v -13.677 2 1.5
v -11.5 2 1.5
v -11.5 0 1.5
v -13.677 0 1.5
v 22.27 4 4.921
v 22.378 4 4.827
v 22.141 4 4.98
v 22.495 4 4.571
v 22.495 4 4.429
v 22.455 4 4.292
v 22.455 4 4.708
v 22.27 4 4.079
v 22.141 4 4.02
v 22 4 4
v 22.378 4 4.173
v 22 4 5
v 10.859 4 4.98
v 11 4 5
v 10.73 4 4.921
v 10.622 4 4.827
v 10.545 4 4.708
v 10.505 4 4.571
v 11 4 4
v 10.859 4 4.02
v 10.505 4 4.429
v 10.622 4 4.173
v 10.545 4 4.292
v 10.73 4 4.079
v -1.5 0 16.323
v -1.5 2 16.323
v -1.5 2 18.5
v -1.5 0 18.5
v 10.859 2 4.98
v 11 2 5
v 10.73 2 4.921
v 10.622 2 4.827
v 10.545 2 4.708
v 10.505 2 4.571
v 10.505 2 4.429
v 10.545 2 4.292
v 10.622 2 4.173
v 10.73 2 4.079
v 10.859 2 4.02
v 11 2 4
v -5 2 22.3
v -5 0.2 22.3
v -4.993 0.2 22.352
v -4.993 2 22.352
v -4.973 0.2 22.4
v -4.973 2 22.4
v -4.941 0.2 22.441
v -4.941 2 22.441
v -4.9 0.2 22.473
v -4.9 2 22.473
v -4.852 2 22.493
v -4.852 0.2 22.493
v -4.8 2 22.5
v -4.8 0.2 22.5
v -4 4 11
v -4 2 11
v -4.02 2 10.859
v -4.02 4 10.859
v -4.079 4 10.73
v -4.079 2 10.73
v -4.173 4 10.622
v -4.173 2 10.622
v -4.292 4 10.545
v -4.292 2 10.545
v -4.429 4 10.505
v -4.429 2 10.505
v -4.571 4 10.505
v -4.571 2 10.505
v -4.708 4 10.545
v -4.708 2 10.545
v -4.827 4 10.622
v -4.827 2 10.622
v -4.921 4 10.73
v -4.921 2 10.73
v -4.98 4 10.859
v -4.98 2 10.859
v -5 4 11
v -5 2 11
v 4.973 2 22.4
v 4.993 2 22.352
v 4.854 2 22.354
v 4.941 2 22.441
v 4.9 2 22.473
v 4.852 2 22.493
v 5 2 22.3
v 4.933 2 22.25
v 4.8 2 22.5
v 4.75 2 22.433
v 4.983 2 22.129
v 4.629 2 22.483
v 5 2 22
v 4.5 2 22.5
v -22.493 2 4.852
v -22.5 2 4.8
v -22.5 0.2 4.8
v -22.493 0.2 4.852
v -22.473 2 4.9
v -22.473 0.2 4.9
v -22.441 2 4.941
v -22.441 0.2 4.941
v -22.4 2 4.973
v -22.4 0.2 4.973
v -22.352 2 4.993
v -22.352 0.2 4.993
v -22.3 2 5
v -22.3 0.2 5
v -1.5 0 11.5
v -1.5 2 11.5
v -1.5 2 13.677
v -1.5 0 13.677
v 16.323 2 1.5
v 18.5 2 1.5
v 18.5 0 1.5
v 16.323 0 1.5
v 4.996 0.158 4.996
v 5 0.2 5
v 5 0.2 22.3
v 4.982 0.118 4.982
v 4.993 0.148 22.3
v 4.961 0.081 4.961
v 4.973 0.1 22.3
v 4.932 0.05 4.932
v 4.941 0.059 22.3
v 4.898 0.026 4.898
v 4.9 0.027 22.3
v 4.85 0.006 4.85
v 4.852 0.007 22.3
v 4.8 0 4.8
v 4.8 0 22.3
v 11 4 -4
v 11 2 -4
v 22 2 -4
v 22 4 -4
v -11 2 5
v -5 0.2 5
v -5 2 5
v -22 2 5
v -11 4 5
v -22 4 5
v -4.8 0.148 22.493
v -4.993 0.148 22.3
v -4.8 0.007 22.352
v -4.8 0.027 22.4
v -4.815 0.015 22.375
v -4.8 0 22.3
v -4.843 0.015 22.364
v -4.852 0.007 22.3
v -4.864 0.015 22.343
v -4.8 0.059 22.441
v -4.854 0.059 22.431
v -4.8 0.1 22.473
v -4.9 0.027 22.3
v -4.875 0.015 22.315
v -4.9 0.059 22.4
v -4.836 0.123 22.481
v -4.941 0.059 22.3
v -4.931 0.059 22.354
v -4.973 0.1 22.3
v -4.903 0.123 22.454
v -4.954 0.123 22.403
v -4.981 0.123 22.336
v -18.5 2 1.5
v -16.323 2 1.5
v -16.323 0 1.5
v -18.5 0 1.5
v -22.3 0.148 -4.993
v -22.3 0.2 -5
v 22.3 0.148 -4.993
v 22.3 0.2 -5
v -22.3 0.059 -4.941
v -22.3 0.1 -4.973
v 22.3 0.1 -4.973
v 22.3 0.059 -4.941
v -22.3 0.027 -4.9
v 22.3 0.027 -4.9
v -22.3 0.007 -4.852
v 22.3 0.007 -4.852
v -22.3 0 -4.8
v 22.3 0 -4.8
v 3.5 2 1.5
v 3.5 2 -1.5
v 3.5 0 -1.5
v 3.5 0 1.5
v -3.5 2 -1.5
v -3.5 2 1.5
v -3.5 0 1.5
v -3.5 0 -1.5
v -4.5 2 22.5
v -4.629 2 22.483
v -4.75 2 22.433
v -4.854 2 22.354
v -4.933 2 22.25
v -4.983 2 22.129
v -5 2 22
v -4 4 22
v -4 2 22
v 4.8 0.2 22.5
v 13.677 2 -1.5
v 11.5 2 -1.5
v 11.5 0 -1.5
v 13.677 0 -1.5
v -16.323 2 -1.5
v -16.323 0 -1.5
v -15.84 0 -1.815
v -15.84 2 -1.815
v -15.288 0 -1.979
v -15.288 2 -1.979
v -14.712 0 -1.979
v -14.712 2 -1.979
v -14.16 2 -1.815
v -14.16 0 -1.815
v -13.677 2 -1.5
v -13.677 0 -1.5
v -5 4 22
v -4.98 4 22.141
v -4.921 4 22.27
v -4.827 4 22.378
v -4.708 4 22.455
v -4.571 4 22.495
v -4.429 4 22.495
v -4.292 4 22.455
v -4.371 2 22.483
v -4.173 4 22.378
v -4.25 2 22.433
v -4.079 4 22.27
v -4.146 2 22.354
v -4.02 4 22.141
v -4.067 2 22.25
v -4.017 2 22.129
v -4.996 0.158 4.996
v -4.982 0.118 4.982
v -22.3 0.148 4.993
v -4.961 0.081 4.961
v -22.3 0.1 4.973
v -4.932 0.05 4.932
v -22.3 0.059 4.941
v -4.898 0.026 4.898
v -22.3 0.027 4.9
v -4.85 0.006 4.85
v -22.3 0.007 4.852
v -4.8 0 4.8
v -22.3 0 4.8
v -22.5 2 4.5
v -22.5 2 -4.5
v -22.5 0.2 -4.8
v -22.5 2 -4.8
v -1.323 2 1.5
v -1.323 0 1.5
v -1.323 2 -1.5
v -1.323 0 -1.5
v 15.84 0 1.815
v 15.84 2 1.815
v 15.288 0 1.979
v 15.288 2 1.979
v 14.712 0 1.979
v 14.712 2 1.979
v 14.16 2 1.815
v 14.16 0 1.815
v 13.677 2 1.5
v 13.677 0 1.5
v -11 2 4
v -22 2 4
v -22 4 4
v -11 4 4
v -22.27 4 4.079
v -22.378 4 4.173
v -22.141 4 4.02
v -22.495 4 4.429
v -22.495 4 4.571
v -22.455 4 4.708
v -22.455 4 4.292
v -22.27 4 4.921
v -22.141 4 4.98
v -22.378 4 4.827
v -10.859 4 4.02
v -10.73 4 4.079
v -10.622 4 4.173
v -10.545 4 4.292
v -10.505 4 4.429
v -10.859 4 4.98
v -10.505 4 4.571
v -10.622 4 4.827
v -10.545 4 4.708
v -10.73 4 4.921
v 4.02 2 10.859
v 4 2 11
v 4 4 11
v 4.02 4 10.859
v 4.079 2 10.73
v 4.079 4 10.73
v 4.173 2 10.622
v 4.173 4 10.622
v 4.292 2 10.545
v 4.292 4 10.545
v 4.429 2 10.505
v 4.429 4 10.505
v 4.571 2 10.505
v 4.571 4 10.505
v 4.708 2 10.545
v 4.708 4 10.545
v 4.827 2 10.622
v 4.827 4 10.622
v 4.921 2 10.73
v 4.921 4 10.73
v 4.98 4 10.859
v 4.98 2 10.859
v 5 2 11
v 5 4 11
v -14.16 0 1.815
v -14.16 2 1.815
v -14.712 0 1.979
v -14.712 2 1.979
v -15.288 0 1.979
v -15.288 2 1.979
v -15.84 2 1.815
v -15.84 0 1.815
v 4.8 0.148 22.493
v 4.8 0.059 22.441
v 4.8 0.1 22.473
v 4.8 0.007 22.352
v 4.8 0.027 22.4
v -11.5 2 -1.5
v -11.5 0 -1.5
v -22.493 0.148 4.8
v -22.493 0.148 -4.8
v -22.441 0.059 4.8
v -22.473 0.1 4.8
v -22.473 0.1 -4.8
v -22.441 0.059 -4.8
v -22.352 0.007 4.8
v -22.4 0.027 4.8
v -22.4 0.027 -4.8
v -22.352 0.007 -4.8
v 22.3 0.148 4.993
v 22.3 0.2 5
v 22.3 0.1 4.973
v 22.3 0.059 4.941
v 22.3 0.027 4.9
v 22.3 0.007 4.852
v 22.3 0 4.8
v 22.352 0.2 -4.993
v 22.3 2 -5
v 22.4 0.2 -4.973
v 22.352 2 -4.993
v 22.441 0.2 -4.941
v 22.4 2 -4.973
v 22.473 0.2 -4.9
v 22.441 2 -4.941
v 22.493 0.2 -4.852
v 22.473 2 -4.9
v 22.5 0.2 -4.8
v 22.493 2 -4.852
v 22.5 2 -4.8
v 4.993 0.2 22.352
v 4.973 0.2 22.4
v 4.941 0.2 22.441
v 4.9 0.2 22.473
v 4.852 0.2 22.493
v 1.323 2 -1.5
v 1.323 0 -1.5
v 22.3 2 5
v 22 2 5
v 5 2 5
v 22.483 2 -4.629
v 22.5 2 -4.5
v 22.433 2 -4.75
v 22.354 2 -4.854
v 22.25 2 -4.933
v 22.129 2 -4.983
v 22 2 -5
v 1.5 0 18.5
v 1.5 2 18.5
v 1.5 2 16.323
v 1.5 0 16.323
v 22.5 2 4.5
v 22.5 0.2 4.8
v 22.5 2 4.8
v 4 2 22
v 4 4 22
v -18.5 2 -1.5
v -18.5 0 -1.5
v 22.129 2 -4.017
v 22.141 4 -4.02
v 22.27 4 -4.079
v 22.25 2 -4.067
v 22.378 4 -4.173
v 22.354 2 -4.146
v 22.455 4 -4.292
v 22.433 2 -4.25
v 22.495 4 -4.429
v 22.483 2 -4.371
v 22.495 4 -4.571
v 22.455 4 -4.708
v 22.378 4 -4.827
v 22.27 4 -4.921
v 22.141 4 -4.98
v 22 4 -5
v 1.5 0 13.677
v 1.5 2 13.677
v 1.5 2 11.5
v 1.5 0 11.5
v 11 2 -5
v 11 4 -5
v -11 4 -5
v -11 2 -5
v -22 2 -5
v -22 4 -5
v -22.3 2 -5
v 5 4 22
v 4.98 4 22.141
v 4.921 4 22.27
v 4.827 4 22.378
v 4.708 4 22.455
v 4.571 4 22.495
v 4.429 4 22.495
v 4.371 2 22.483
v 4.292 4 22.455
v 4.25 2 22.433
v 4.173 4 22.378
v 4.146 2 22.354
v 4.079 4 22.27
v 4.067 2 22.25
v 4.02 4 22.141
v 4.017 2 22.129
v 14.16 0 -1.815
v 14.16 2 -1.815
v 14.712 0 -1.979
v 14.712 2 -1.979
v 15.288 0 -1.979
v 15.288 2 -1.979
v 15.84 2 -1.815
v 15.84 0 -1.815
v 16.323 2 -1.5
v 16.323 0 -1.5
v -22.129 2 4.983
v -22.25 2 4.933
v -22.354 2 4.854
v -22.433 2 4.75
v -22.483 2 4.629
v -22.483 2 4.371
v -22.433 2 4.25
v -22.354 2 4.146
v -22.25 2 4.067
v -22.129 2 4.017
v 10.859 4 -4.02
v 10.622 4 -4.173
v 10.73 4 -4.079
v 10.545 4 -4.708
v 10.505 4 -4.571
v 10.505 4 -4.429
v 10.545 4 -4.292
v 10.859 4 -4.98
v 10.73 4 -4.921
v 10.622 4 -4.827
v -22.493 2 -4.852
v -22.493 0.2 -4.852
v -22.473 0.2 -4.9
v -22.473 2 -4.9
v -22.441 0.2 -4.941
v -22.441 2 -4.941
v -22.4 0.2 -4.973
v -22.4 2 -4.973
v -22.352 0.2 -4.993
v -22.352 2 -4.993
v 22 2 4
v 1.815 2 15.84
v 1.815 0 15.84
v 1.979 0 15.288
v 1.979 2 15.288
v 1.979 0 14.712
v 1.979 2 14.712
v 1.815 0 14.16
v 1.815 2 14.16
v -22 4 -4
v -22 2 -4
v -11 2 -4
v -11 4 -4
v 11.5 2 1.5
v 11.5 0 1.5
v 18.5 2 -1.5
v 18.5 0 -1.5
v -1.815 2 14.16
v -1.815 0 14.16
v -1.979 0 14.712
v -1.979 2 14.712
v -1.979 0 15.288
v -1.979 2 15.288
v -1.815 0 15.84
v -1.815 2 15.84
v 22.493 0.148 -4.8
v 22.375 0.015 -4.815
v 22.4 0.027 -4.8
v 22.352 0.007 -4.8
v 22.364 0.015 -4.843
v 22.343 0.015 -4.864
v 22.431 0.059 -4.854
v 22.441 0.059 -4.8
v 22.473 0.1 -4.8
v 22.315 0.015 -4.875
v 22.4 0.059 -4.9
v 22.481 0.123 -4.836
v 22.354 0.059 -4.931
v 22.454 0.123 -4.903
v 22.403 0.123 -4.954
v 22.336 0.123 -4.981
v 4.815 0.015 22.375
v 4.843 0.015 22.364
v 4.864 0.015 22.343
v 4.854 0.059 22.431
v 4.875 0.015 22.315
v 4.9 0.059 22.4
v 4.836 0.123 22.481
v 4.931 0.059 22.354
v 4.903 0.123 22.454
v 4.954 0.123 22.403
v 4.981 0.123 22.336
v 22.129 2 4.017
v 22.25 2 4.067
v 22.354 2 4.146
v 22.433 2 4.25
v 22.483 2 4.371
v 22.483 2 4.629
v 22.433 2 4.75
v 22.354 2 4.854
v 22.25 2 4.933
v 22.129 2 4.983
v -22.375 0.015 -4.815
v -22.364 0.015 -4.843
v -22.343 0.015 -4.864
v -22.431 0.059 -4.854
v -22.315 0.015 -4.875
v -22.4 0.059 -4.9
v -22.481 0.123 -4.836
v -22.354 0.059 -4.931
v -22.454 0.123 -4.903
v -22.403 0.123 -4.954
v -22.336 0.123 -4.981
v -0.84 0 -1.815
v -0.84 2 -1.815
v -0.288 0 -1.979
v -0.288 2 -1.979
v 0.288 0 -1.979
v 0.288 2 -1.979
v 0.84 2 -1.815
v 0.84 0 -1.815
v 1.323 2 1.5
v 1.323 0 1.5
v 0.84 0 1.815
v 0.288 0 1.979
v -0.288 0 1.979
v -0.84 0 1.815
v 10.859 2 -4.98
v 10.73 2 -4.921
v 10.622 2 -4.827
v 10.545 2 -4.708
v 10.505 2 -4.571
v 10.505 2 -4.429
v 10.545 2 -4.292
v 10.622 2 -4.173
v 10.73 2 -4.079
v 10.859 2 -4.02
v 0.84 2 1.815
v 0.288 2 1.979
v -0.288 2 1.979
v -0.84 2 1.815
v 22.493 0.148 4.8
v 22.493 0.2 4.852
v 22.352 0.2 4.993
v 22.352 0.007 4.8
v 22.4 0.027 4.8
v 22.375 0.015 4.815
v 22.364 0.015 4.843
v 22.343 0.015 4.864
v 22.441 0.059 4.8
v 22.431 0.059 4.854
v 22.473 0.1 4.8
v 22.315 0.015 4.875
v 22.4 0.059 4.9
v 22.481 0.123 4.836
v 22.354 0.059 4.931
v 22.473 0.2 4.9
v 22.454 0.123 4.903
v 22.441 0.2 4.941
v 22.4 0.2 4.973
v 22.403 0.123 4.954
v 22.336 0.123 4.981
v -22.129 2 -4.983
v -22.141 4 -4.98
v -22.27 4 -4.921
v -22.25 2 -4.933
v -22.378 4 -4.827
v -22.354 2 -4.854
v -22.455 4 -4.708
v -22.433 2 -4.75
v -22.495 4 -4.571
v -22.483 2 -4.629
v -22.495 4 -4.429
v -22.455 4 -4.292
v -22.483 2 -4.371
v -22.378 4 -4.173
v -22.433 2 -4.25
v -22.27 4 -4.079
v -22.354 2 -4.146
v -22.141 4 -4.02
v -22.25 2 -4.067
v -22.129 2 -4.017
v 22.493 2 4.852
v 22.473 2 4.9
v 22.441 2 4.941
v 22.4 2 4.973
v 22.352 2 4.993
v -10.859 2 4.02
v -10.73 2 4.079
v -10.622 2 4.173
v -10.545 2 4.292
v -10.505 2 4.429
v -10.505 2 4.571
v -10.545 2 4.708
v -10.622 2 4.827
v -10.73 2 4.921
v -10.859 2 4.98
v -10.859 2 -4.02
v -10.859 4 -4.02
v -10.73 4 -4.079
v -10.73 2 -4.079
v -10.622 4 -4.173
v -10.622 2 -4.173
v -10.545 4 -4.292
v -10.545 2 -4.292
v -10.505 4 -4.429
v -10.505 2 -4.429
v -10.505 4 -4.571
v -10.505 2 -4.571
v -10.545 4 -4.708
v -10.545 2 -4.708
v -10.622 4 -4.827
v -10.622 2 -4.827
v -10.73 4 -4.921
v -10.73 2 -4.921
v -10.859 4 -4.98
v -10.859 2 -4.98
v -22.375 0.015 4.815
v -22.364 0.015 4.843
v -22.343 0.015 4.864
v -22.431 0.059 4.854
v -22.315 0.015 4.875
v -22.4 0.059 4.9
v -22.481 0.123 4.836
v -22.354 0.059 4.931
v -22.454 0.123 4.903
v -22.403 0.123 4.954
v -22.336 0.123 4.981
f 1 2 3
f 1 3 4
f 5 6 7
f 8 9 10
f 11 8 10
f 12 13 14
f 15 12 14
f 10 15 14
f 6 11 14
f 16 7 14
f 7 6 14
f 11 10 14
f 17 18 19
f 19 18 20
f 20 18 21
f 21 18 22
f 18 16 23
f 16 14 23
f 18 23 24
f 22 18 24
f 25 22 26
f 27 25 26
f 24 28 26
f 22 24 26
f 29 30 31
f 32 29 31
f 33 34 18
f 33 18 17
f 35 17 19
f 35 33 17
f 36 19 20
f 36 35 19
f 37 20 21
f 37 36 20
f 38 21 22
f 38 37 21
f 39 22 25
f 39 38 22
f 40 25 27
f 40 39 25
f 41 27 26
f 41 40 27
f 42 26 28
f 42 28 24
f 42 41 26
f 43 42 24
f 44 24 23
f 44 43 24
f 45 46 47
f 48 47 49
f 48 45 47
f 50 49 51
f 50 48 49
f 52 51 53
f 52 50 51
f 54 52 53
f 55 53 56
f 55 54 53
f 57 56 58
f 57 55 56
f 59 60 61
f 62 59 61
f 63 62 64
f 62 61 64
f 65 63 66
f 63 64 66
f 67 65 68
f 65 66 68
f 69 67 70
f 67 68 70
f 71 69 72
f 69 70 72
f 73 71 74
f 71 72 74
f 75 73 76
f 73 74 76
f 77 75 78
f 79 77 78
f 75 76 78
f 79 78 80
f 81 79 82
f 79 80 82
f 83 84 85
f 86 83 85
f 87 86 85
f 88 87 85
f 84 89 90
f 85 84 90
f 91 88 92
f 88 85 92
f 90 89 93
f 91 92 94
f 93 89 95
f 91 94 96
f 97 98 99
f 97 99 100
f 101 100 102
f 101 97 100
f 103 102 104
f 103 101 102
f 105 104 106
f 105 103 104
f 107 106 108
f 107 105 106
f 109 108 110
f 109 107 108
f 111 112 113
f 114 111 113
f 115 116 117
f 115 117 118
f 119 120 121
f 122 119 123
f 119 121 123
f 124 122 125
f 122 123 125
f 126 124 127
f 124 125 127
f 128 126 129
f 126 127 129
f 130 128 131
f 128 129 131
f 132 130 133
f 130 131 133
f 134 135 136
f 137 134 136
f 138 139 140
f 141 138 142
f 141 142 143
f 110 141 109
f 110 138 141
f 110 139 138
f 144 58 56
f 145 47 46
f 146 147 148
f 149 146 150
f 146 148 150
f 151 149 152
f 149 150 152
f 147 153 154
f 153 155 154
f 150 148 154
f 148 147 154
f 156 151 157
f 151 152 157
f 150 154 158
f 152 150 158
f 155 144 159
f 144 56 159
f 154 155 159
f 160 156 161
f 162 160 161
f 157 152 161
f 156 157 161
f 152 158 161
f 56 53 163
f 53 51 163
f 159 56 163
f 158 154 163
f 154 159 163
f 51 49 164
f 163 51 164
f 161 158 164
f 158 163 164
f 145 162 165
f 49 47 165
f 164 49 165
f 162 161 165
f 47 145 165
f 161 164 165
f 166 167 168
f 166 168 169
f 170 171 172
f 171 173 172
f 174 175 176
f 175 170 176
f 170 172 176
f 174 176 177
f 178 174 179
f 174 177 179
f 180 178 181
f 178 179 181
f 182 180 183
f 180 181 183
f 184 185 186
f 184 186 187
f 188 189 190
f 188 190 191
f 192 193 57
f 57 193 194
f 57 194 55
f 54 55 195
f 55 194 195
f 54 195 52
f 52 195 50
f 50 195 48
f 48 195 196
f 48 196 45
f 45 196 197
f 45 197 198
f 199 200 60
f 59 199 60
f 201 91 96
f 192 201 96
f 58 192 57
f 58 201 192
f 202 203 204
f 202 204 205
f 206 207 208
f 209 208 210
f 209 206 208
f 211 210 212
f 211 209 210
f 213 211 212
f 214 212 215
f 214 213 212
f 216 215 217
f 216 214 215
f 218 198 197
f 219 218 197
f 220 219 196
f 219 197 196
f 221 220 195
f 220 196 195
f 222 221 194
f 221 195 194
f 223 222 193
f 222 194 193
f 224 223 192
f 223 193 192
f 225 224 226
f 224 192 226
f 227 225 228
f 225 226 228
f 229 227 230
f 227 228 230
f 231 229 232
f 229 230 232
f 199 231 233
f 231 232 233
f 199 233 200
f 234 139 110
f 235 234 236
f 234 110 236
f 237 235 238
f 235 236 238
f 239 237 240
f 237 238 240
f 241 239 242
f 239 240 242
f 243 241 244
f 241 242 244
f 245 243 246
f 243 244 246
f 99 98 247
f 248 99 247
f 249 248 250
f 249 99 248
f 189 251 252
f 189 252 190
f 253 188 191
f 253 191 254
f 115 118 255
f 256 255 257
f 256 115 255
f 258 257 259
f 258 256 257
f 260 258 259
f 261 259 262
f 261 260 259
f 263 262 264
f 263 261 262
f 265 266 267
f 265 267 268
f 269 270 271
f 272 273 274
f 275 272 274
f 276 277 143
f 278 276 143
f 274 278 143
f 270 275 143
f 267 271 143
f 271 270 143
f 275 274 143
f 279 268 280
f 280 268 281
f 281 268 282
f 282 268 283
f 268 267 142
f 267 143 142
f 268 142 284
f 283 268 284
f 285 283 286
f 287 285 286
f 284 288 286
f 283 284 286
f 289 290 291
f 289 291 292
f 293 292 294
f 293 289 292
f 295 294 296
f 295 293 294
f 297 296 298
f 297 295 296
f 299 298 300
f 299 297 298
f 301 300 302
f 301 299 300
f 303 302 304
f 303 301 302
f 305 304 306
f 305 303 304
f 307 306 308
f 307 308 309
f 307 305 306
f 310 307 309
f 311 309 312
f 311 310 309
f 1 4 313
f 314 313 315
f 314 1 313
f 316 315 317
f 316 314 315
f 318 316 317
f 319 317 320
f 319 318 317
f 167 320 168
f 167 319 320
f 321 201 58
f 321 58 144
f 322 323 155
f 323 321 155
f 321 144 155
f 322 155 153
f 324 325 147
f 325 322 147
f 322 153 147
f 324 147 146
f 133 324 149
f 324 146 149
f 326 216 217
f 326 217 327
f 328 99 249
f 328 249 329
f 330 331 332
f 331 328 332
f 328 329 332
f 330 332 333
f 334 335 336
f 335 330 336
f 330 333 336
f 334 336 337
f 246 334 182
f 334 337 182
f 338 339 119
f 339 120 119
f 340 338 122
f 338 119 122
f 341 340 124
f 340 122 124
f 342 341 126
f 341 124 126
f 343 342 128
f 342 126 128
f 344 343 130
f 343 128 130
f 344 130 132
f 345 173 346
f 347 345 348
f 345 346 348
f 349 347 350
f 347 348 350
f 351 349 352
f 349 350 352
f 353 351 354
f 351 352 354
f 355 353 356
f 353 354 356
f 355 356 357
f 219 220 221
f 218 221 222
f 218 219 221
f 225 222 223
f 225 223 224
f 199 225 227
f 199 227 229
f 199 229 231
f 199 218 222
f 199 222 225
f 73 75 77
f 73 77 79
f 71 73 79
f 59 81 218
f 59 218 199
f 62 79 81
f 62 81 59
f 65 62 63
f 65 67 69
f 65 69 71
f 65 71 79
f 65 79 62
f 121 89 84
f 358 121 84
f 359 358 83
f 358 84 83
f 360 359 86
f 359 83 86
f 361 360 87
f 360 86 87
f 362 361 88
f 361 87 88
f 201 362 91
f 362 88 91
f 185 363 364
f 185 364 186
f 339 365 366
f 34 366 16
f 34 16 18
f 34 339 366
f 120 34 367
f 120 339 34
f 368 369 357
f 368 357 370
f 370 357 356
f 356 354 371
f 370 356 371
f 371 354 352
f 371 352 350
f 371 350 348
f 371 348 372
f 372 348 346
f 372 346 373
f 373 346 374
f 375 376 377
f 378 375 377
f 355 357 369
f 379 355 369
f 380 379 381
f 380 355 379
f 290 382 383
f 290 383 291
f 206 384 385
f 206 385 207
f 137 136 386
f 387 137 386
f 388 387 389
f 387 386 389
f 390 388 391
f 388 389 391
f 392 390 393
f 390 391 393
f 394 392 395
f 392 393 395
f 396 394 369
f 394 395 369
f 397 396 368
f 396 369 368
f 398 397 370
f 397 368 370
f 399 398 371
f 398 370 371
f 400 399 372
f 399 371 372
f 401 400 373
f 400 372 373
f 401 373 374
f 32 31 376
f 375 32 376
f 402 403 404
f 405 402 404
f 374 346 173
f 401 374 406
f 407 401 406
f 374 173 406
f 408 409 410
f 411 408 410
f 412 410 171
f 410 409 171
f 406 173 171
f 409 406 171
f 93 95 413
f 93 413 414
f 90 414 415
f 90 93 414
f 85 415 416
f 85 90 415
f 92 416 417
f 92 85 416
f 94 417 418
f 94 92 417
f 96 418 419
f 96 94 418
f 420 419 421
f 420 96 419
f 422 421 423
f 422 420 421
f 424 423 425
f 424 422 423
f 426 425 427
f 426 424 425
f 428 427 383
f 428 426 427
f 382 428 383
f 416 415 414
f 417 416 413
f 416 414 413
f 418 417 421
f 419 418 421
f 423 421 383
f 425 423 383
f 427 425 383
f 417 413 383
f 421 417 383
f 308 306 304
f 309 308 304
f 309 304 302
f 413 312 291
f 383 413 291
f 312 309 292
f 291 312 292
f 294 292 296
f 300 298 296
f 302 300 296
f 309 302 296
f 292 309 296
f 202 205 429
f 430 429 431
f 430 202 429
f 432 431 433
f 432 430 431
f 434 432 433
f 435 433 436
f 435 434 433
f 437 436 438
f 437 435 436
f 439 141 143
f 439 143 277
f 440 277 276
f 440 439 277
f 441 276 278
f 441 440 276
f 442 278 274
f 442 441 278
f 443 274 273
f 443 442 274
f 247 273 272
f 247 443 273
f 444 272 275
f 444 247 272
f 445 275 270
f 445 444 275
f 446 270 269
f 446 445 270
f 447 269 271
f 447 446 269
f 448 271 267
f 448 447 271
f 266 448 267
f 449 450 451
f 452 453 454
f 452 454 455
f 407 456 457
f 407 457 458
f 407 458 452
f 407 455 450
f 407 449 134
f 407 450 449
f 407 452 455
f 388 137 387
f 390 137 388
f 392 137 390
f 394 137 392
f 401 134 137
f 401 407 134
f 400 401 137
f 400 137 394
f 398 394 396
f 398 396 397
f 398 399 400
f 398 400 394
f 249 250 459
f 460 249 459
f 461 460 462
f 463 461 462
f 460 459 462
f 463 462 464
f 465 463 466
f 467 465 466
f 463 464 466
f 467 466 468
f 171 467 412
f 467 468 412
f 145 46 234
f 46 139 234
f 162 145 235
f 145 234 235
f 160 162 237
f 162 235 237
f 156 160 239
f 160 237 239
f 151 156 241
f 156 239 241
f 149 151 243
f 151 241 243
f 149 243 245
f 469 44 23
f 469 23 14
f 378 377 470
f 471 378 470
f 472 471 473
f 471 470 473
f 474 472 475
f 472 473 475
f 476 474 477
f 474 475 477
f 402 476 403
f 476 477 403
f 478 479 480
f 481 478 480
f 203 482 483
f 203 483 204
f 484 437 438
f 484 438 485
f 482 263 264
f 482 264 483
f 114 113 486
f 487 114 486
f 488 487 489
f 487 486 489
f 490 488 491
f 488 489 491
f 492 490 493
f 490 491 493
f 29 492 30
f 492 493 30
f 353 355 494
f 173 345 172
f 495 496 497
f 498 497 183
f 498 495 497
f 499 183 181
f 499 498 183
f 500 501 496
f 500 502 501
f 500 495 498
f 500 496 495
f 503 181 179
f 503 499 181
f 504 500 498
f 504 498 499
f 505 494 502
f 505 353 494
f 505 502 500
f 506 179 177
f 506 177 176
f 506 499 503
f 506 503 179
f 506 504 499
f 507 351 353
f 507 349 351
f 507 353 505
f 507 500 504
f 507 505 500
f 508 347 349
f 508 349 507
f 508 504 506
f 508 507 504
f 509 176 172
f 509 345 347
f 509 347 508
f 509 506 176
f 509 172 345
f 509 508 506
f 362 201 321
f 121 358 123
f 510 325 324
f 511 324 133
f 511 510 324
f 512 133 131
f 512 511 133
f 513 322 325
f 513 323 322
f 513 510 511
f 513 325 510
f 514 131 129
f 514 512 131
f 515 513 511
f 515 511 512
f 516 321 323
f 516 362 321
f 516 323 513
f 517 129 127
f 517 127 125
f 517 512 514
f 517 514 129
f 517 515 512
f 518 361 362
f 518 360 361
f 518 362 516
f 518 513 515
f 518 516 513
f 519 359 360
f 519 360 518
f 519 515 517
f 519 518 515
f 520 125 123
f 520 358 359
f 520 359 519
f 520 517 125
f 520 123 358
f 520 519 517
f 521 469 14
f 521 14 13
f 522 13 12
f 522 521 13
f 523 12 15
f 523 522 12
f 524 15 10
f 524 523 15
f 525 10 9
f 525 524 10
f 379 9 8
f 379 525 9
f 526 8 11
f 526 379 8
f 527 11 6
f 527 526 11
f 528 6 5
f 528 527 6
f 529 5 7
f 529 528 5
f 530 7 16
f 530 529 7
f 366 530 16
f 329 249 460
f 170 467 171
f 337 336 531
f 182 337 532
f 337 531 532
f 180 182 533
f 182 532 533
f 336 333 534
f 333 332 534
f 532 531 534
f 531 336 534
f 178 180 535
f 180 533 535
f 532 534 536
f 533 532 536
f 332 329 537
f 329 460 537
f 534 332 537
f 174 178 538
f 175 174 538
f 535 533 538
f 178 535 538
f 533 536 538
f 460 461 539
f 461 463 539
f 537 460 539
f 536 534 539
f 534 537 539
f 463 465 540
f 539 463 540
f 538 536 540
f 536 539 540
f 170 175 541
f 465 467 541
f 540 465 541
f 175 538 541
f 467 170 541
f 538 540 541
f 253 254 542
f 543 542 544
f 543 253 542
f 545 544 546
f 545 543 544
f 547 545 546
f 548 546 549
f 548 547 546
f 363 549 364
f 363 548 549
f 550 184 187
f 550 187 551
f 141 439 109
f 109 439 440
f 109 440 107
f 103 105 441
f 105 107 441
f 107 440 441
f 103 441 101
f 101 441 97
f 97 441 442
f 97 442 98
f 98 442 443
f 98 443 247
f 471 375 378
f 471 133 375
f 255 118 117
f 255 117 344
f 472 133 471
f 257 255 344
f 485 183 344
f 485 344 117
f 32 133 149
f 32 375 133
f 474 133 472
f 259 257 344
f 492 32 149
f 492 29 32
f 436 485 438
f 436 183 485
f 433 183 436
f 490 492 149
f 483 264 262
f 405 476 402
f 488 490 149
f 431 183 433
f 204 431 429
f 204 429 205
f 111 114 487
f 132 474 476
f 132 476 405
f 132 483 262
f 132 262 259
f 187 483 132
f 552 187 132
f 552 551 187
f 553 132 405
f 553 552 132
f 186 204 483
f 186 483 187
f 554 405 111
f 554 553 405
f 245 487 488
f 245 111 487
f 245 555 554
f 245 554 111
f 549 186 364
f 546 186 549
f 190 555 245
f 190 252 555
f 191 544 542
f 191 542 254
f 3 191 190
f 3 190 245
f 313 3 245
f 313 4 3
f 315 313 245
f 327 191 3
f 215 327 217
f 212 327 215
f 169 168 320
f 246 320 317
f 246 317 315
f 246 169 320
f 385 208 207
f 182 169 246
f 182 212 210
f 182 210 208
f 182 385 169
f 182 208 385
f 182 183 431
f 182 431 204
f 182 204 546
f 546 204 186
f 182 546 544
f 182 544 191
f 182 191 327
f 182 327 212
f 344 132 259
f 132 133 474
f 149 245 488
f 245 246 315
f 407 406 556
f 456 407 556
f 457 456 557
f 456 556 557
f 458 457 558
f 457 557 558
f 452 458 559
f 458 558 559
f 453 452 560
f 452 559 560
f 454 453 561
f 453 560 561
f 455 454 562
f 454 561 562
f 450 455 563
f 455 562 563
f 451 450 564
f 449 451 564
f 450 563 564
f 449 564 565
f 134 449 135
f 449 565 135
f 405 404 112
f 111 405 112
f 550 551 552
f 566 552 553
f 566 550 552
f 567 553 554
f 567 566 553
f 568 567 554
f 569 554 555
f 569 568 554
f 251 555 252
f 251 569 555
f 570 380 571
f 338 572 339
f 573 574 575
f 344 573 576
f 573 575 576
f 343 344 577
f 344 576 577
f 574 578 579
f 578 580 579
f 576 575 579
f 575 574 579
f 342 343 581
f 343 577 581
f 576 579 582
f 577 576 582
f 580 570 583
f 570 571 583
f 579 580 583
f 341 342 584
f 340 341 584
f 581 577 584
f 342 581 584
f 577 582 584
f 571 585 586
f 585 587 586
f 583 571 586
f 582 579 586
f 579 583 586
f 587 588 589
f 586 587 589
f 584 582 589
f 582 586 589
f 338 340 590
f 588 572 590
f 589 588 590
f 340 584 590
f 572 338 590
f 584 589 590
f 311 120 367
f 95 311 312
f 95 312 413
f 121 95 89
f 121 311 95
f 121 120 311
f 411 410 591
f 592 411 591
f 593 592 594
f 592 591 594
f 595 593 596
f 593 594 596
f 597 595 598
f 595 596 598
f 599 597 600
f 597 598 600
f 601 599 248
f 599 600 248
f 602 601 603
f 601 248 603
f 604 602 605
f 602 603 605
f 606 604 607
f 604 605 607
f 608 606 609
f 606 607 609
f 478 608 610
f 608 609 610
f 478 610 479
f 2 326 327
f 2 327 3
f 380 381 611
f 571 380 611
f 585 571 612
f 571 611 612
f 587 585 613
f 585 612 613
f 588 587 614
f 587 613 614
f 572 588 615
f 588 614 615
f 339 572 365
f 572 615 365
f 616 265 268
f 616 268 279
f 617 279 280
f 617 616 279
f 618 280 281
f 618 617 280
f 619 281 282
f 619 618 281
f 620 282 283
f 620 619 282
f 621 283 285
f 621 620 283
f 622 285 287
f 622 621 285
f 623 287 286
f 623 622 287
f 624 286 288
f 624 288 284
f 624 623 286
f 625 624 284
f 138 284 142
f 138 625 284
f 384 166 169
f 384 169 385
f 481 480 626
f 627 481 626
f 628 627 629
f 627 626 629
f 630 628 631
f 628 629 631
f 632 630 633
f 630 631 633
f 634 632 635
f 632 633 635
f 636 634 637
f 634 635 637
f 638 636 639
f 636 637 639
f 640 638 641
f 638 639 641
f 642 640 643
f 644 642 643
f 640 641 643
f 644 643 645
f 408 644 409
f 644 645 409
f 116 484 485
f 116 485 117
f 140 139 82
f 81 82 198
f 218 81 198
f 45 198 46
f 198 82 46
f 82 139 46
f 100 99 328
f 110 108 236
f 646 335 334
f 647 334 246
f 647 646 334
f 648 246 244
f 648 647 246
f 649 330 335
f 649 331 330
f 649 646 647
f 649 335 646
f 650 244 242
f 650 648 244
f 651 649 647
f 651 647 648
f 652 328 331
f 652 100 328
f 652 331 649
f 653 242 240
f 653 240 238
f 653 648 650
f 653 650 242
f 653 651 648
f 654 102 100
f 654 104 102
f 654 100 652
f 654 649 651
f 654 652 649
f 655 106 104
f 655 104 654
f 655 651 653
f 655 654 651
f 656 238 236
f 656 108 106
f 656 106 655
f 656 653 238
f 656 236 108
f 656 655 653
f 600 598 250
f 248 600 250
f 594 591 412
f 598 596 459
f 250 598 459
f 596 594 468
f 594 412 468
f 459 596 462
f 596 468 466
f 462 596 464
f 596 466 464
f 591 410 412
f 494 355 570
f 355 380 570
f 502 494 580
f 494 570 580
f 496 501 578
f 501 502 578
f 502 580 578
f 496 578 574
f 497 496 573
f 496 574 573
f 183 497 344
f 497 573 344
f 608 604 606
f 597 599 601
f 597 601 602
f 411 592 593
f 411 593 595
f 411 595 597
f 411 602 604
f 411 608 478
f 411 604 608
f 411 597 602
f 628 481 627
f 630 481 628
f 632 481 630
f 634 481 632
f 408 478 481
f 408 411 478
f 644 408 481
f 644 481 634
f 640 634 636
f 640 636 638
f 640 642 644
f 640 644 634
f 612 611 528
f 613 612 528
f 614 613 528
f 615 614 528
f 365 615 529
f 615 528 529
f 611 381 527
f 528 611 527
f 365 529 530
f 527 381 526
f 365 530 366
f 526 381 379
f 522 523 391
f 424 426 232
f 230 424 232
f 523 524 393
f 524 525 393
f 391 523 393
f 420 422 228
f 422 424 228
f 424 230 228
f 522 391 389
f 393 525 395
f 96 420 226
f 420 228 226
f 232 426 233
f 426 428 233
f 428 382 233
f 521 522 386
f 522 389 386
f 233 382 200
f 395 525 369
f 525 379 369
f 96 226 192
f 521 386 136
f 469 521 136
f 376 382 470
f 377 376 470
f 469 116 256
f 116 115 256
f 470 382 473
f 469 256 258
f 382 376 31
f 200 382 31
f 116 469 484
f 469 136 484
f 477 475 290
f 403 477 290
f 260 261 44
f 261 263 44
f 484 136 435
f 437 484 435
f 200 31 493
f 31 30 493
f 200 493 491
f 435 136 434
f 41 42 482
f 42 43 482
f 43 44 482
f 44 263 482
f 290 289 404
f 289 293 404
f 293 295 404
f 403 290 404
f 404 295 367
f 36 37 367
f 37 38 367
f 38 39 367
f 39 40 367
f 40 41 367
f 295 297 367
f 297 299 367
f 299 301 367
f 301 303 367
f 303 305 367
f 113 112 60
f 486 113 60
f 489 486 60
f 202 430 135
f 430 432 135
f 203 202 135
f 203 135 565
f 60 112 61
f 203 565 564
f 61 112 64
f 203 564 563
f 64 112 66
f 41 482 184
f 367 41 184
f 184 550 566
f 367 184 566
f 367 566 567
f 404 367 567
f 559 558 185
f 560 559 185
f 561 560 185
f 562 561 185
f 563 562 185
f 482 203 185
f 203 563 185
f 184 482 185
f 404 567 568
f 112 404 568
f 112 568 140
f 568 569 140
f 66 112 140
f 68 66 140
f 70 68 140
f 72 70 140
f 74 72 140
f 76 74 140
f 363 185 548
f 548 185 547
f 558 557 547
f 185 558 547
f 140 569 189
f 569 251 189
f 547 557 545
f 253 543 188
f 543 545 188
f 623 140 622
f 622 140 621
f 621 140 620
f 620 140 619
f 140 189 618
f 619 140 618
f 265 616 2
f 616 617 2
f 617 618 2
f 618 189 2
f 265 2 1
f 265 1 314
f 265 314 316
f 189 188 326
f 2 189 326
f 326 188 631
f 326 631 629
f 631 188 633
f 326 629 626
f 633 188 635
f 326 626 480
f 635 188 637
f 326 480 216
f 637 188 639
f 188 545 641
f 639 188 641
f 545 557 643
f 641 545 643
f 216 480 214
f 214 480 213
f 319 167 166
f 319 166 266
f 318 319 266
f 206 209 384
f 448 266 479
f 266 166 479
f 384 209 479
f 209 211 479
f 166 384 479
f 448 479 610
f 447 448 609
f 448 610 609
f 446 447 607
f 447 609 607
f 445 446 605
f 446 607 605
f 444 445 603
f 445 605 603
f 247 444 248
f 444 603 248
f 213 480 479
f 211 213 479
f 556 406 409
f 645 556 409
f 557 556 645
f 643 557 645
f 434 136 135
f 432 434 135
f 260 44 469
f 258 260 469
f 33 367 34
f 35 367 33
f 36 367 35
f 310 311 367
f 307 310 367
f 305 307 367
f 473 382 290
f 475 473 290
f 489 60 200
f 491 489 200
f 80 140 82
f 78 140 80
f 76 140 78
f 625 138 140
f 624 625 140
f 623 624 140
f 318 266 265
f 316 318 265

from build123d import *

# Parameters (mm, degrees)
EXTRUDE_1_DEPTH               = 2
EXTRUDE_2_DEPTH               = 2
PATTERN_LINEAR_1_COUNT        = 2
PATTERN_LINEAR_1_PITCH        = 33
PATTERN_LINEAR_1_COPY_1_DEPTH = 2
EXTRUDE_3_DEPTH               = 2
CUT_EXTRUDE_1_REACH           = 33.883
PATTERN_LINEAR_2_COUNT        = 2
PATTERN_LINEAR_2_PITCH        = 15
PATTERN_LINEAR_2_COL_COUNT    = 2
PATTERN_LINEAR_2_COL_PITCH    = 15
CUT_EXTRUDE_2_REACH           = 33.883
FILLET_1_R                    = 0.2


with BuildPart() as part:
    # 草图1 → 凸台-拉伸1 (new body)
    with BuildSketch(Plane(origin=(0, 0, 0), x_dir=(1, 0, 0), z_dir=(0, 1, 0))):
        Polygon((22.5, 5), (22.5, -5), (5, -5), (5, -22.5), (-5, -22.5), (-5, -5), (-22.5, -5), (-22.5, 5), align=None)
    extrude(amount=EXTRUDE_1_DEPTH)

    # 草图2 → 凸台-拉伸2 (add)
    with BuildSketch(Plane(origin=(0, 2, 0), x_dir=(1, 0, 0), z_dir=(0, 1, 0))):
        with BuildLine():
            Line((-22, 4), (-11, 4))
            ThreePointArc((-11, 4), (-10.5, 4.5), (-11, 5))
            Line((-11, 5), (-22, 5))
            ThreePointArc((-22, 5), (-22.5, 4.5), (-22, 4))
        make_face()
    extrude_2 = extrude(amount=EXTRUDE_2_DEPTH)

    # 镜向1: 凸台-拉伸2 across plane
    add(extrude_2.mirror(Plane.XY))

    # 阵列(线性)1: 凸台-拉伸2 ×2
    with Locations(*[(i * PATTERN_LINEAR_1_PITCH, 0, 0) for i in range(1, PATTERN_LINEAR_1_COUNT)]):
        add(extrude_2)

    # 阵列(线性)1 copy 1 sketch → 阵列(线性)1 copy 1 (add)
    with BuildSketch(Plane(origin=(33, 2, 0), x_dir=(1, 0, 0), z_dir=(0, 1, 0))):
        with BuildLine():
            Line((-22, -4), (-11, -4))
            ThreePointArc((-11, -4), (-10.5, -4.5), (-11, -5))
            Line((-11, -5), (-22, -5))
            ThreePointArc((-22, -5), (-22.5, -4.5), (-22, -4))
        make_face()
    extrude(amount=PATTERN_LINEAR_1_COPY_1_DEPTH)

    # 草图3 → 凸台-拉伸3 (add)
    with BuildSketch(Plane(origin=(0, 2, 0), x_dir=(1, 0, 0), z_dir=(0, 1, 0))):
        with BuildLine():
            Line((-4, -22), (-4, -11))
            ThreePointArc((-4, -11), (-4.5, -10.5), (-5, -11))
            Line((-5, -11), (-5, -22))
            ThreePointArc((-5, -22), (-4.5, -22.5), (-4, -22))
        make_face()
    extrude_3 = extrude(amount=EXTRUDE_3_DEPTH)

    # 镜向2: 凸台-拉伸3 across plane
    add(extrude_3.mirror(Plane(origin=(0, 0, 0), x_dir=(0, 0, 1), z_dir=(1, 0, 0))))

    # 草图4 → 切除-拉伸1 (cut, up to next)
    with BuildSketch(Plane(origin=(0, 2, 0), x_dir=(1, 0, 0), z_dir=(0, 1, 0)), mode=Mode.PRIVATE) as cut_extrude_1_sk1:
        with BuildLine():
            Line((3.5, 1.5), (3.5, -1.5))
            Line((3.5, -1.5), (1.322875656, -1.5))
            ThreePointArc((1.322875656, -1.5), (0, -2), (-1.322875656, -1.5))
            Line((-1.322875656, -1.5), (-3.5, -1.5))
            Line((-3.5, -1.5), (-3.5, 1.5))
            Line((-3.5, 1.5), (-1.322875656, 1.5))
            ThreePointArc((-1.322875656, 1.5), (0, 2), (1.322875656, 1.5))
            Line((1.322875656, 1.5), (3.5, 1.5))
        make_face()
    cut_extrude_1_tool1 = extrude(cut_extrude_1_sk1.sketch, amount=-CUT_EXTRUDE_1_REACH, mode=Mode.PRIVATE) & part.part
    cut_extrude_1 = cut_extrude_1_tool1.solids().sort_by_distance((0, 2, 0))[0]
    add(cut_extrude_1, mode=Mode.SUBTRACT)

    # 阵列(线性)2: 切除-拉伸1 ×2
    with Locations(*[(i * PATTERN_LINEAR_2_PITCH, 0, 0) for i in range(1, PATTERN_LINEAR_2_COUNT)]):
        add(cut_extrude_1, mode=Mode.SUBTRACT)

    # 阵列(线性)2 col: 切除-拉伸1 ×2
    with Locations(*[(-i * PATTERN_LINEAR_2_COL_PITCH, 0, 0) for i in range(1, PATTERN_LINEAR_2_COL_COUNT)]):
        add(cut_extrude_1, mode=Mode.SUBTRACT)

    # 草图5 → 切除-拉伸2 (cut, up to next)
    with BuildSketch(Plane(origin=(0, 2, 0), x_dir=(1, 0, 0), z_dir=(0, 1, 0)), mode=Mode.PRIVATE) as cut_extrude_2_sk1:
        with BuildLine():
            Line((1.5, -11.5), (-1.5, -11.5))
            Line((-1.5, -11.5), (-1.5, -13.677124344))
            ThreePointArc((-1.5, -13.677124344), (-2, -15), (-1.5, -16.322875656))
            Line((-1.5, -16.322875656), (-1.5, -18.5))
            Line((-1.5, -18.5), (1.5, -18.5))
            Line((1.5, -18.5), (1.5, -16.322875656))
            ThreePointArc((1.5, -16.322875656), (2, -15), (1.5, -13.677124344))
            Line((1.5, -13.677124344), (1.5, -11.5))
        make_face()
    cut_extrude_2_tool1 = extrude(cut_extrude_2_sk1.sketch, amount=-CUT_EXTRUDE_2_REACH, mode=Mode.PRIVATE) & part.part
    add(cut_extrude_2_tool1.solids().sort_by_distance((0, 2, 15))[0], mode=Mode.SUBTRACT)

    # 圆角1
    fillet_1_edges = [part.edges().sort_by_distance(p)[0] for p in [
        (22.5, 1, 5),
        (22.5, 1, -5),
        (-22.5, 1, -5),
        (-22.5, 1, 5),
        (5, 1, 22.5),
        (-5, 1, 22.5),
        (-22.5, 0, 0),
        (22.5, 0, 0),
        (0, 0, 22.5),
        (5, 0, 13.75),
        (-5, 0, 13.75),
        (-13.75, 0, 5),
        (13.75, 0, 5),
        (0, 0, -5),
    ]]
    fillet(fillet_1_edges, radius=FILLET_1_R)


solid = part.part
